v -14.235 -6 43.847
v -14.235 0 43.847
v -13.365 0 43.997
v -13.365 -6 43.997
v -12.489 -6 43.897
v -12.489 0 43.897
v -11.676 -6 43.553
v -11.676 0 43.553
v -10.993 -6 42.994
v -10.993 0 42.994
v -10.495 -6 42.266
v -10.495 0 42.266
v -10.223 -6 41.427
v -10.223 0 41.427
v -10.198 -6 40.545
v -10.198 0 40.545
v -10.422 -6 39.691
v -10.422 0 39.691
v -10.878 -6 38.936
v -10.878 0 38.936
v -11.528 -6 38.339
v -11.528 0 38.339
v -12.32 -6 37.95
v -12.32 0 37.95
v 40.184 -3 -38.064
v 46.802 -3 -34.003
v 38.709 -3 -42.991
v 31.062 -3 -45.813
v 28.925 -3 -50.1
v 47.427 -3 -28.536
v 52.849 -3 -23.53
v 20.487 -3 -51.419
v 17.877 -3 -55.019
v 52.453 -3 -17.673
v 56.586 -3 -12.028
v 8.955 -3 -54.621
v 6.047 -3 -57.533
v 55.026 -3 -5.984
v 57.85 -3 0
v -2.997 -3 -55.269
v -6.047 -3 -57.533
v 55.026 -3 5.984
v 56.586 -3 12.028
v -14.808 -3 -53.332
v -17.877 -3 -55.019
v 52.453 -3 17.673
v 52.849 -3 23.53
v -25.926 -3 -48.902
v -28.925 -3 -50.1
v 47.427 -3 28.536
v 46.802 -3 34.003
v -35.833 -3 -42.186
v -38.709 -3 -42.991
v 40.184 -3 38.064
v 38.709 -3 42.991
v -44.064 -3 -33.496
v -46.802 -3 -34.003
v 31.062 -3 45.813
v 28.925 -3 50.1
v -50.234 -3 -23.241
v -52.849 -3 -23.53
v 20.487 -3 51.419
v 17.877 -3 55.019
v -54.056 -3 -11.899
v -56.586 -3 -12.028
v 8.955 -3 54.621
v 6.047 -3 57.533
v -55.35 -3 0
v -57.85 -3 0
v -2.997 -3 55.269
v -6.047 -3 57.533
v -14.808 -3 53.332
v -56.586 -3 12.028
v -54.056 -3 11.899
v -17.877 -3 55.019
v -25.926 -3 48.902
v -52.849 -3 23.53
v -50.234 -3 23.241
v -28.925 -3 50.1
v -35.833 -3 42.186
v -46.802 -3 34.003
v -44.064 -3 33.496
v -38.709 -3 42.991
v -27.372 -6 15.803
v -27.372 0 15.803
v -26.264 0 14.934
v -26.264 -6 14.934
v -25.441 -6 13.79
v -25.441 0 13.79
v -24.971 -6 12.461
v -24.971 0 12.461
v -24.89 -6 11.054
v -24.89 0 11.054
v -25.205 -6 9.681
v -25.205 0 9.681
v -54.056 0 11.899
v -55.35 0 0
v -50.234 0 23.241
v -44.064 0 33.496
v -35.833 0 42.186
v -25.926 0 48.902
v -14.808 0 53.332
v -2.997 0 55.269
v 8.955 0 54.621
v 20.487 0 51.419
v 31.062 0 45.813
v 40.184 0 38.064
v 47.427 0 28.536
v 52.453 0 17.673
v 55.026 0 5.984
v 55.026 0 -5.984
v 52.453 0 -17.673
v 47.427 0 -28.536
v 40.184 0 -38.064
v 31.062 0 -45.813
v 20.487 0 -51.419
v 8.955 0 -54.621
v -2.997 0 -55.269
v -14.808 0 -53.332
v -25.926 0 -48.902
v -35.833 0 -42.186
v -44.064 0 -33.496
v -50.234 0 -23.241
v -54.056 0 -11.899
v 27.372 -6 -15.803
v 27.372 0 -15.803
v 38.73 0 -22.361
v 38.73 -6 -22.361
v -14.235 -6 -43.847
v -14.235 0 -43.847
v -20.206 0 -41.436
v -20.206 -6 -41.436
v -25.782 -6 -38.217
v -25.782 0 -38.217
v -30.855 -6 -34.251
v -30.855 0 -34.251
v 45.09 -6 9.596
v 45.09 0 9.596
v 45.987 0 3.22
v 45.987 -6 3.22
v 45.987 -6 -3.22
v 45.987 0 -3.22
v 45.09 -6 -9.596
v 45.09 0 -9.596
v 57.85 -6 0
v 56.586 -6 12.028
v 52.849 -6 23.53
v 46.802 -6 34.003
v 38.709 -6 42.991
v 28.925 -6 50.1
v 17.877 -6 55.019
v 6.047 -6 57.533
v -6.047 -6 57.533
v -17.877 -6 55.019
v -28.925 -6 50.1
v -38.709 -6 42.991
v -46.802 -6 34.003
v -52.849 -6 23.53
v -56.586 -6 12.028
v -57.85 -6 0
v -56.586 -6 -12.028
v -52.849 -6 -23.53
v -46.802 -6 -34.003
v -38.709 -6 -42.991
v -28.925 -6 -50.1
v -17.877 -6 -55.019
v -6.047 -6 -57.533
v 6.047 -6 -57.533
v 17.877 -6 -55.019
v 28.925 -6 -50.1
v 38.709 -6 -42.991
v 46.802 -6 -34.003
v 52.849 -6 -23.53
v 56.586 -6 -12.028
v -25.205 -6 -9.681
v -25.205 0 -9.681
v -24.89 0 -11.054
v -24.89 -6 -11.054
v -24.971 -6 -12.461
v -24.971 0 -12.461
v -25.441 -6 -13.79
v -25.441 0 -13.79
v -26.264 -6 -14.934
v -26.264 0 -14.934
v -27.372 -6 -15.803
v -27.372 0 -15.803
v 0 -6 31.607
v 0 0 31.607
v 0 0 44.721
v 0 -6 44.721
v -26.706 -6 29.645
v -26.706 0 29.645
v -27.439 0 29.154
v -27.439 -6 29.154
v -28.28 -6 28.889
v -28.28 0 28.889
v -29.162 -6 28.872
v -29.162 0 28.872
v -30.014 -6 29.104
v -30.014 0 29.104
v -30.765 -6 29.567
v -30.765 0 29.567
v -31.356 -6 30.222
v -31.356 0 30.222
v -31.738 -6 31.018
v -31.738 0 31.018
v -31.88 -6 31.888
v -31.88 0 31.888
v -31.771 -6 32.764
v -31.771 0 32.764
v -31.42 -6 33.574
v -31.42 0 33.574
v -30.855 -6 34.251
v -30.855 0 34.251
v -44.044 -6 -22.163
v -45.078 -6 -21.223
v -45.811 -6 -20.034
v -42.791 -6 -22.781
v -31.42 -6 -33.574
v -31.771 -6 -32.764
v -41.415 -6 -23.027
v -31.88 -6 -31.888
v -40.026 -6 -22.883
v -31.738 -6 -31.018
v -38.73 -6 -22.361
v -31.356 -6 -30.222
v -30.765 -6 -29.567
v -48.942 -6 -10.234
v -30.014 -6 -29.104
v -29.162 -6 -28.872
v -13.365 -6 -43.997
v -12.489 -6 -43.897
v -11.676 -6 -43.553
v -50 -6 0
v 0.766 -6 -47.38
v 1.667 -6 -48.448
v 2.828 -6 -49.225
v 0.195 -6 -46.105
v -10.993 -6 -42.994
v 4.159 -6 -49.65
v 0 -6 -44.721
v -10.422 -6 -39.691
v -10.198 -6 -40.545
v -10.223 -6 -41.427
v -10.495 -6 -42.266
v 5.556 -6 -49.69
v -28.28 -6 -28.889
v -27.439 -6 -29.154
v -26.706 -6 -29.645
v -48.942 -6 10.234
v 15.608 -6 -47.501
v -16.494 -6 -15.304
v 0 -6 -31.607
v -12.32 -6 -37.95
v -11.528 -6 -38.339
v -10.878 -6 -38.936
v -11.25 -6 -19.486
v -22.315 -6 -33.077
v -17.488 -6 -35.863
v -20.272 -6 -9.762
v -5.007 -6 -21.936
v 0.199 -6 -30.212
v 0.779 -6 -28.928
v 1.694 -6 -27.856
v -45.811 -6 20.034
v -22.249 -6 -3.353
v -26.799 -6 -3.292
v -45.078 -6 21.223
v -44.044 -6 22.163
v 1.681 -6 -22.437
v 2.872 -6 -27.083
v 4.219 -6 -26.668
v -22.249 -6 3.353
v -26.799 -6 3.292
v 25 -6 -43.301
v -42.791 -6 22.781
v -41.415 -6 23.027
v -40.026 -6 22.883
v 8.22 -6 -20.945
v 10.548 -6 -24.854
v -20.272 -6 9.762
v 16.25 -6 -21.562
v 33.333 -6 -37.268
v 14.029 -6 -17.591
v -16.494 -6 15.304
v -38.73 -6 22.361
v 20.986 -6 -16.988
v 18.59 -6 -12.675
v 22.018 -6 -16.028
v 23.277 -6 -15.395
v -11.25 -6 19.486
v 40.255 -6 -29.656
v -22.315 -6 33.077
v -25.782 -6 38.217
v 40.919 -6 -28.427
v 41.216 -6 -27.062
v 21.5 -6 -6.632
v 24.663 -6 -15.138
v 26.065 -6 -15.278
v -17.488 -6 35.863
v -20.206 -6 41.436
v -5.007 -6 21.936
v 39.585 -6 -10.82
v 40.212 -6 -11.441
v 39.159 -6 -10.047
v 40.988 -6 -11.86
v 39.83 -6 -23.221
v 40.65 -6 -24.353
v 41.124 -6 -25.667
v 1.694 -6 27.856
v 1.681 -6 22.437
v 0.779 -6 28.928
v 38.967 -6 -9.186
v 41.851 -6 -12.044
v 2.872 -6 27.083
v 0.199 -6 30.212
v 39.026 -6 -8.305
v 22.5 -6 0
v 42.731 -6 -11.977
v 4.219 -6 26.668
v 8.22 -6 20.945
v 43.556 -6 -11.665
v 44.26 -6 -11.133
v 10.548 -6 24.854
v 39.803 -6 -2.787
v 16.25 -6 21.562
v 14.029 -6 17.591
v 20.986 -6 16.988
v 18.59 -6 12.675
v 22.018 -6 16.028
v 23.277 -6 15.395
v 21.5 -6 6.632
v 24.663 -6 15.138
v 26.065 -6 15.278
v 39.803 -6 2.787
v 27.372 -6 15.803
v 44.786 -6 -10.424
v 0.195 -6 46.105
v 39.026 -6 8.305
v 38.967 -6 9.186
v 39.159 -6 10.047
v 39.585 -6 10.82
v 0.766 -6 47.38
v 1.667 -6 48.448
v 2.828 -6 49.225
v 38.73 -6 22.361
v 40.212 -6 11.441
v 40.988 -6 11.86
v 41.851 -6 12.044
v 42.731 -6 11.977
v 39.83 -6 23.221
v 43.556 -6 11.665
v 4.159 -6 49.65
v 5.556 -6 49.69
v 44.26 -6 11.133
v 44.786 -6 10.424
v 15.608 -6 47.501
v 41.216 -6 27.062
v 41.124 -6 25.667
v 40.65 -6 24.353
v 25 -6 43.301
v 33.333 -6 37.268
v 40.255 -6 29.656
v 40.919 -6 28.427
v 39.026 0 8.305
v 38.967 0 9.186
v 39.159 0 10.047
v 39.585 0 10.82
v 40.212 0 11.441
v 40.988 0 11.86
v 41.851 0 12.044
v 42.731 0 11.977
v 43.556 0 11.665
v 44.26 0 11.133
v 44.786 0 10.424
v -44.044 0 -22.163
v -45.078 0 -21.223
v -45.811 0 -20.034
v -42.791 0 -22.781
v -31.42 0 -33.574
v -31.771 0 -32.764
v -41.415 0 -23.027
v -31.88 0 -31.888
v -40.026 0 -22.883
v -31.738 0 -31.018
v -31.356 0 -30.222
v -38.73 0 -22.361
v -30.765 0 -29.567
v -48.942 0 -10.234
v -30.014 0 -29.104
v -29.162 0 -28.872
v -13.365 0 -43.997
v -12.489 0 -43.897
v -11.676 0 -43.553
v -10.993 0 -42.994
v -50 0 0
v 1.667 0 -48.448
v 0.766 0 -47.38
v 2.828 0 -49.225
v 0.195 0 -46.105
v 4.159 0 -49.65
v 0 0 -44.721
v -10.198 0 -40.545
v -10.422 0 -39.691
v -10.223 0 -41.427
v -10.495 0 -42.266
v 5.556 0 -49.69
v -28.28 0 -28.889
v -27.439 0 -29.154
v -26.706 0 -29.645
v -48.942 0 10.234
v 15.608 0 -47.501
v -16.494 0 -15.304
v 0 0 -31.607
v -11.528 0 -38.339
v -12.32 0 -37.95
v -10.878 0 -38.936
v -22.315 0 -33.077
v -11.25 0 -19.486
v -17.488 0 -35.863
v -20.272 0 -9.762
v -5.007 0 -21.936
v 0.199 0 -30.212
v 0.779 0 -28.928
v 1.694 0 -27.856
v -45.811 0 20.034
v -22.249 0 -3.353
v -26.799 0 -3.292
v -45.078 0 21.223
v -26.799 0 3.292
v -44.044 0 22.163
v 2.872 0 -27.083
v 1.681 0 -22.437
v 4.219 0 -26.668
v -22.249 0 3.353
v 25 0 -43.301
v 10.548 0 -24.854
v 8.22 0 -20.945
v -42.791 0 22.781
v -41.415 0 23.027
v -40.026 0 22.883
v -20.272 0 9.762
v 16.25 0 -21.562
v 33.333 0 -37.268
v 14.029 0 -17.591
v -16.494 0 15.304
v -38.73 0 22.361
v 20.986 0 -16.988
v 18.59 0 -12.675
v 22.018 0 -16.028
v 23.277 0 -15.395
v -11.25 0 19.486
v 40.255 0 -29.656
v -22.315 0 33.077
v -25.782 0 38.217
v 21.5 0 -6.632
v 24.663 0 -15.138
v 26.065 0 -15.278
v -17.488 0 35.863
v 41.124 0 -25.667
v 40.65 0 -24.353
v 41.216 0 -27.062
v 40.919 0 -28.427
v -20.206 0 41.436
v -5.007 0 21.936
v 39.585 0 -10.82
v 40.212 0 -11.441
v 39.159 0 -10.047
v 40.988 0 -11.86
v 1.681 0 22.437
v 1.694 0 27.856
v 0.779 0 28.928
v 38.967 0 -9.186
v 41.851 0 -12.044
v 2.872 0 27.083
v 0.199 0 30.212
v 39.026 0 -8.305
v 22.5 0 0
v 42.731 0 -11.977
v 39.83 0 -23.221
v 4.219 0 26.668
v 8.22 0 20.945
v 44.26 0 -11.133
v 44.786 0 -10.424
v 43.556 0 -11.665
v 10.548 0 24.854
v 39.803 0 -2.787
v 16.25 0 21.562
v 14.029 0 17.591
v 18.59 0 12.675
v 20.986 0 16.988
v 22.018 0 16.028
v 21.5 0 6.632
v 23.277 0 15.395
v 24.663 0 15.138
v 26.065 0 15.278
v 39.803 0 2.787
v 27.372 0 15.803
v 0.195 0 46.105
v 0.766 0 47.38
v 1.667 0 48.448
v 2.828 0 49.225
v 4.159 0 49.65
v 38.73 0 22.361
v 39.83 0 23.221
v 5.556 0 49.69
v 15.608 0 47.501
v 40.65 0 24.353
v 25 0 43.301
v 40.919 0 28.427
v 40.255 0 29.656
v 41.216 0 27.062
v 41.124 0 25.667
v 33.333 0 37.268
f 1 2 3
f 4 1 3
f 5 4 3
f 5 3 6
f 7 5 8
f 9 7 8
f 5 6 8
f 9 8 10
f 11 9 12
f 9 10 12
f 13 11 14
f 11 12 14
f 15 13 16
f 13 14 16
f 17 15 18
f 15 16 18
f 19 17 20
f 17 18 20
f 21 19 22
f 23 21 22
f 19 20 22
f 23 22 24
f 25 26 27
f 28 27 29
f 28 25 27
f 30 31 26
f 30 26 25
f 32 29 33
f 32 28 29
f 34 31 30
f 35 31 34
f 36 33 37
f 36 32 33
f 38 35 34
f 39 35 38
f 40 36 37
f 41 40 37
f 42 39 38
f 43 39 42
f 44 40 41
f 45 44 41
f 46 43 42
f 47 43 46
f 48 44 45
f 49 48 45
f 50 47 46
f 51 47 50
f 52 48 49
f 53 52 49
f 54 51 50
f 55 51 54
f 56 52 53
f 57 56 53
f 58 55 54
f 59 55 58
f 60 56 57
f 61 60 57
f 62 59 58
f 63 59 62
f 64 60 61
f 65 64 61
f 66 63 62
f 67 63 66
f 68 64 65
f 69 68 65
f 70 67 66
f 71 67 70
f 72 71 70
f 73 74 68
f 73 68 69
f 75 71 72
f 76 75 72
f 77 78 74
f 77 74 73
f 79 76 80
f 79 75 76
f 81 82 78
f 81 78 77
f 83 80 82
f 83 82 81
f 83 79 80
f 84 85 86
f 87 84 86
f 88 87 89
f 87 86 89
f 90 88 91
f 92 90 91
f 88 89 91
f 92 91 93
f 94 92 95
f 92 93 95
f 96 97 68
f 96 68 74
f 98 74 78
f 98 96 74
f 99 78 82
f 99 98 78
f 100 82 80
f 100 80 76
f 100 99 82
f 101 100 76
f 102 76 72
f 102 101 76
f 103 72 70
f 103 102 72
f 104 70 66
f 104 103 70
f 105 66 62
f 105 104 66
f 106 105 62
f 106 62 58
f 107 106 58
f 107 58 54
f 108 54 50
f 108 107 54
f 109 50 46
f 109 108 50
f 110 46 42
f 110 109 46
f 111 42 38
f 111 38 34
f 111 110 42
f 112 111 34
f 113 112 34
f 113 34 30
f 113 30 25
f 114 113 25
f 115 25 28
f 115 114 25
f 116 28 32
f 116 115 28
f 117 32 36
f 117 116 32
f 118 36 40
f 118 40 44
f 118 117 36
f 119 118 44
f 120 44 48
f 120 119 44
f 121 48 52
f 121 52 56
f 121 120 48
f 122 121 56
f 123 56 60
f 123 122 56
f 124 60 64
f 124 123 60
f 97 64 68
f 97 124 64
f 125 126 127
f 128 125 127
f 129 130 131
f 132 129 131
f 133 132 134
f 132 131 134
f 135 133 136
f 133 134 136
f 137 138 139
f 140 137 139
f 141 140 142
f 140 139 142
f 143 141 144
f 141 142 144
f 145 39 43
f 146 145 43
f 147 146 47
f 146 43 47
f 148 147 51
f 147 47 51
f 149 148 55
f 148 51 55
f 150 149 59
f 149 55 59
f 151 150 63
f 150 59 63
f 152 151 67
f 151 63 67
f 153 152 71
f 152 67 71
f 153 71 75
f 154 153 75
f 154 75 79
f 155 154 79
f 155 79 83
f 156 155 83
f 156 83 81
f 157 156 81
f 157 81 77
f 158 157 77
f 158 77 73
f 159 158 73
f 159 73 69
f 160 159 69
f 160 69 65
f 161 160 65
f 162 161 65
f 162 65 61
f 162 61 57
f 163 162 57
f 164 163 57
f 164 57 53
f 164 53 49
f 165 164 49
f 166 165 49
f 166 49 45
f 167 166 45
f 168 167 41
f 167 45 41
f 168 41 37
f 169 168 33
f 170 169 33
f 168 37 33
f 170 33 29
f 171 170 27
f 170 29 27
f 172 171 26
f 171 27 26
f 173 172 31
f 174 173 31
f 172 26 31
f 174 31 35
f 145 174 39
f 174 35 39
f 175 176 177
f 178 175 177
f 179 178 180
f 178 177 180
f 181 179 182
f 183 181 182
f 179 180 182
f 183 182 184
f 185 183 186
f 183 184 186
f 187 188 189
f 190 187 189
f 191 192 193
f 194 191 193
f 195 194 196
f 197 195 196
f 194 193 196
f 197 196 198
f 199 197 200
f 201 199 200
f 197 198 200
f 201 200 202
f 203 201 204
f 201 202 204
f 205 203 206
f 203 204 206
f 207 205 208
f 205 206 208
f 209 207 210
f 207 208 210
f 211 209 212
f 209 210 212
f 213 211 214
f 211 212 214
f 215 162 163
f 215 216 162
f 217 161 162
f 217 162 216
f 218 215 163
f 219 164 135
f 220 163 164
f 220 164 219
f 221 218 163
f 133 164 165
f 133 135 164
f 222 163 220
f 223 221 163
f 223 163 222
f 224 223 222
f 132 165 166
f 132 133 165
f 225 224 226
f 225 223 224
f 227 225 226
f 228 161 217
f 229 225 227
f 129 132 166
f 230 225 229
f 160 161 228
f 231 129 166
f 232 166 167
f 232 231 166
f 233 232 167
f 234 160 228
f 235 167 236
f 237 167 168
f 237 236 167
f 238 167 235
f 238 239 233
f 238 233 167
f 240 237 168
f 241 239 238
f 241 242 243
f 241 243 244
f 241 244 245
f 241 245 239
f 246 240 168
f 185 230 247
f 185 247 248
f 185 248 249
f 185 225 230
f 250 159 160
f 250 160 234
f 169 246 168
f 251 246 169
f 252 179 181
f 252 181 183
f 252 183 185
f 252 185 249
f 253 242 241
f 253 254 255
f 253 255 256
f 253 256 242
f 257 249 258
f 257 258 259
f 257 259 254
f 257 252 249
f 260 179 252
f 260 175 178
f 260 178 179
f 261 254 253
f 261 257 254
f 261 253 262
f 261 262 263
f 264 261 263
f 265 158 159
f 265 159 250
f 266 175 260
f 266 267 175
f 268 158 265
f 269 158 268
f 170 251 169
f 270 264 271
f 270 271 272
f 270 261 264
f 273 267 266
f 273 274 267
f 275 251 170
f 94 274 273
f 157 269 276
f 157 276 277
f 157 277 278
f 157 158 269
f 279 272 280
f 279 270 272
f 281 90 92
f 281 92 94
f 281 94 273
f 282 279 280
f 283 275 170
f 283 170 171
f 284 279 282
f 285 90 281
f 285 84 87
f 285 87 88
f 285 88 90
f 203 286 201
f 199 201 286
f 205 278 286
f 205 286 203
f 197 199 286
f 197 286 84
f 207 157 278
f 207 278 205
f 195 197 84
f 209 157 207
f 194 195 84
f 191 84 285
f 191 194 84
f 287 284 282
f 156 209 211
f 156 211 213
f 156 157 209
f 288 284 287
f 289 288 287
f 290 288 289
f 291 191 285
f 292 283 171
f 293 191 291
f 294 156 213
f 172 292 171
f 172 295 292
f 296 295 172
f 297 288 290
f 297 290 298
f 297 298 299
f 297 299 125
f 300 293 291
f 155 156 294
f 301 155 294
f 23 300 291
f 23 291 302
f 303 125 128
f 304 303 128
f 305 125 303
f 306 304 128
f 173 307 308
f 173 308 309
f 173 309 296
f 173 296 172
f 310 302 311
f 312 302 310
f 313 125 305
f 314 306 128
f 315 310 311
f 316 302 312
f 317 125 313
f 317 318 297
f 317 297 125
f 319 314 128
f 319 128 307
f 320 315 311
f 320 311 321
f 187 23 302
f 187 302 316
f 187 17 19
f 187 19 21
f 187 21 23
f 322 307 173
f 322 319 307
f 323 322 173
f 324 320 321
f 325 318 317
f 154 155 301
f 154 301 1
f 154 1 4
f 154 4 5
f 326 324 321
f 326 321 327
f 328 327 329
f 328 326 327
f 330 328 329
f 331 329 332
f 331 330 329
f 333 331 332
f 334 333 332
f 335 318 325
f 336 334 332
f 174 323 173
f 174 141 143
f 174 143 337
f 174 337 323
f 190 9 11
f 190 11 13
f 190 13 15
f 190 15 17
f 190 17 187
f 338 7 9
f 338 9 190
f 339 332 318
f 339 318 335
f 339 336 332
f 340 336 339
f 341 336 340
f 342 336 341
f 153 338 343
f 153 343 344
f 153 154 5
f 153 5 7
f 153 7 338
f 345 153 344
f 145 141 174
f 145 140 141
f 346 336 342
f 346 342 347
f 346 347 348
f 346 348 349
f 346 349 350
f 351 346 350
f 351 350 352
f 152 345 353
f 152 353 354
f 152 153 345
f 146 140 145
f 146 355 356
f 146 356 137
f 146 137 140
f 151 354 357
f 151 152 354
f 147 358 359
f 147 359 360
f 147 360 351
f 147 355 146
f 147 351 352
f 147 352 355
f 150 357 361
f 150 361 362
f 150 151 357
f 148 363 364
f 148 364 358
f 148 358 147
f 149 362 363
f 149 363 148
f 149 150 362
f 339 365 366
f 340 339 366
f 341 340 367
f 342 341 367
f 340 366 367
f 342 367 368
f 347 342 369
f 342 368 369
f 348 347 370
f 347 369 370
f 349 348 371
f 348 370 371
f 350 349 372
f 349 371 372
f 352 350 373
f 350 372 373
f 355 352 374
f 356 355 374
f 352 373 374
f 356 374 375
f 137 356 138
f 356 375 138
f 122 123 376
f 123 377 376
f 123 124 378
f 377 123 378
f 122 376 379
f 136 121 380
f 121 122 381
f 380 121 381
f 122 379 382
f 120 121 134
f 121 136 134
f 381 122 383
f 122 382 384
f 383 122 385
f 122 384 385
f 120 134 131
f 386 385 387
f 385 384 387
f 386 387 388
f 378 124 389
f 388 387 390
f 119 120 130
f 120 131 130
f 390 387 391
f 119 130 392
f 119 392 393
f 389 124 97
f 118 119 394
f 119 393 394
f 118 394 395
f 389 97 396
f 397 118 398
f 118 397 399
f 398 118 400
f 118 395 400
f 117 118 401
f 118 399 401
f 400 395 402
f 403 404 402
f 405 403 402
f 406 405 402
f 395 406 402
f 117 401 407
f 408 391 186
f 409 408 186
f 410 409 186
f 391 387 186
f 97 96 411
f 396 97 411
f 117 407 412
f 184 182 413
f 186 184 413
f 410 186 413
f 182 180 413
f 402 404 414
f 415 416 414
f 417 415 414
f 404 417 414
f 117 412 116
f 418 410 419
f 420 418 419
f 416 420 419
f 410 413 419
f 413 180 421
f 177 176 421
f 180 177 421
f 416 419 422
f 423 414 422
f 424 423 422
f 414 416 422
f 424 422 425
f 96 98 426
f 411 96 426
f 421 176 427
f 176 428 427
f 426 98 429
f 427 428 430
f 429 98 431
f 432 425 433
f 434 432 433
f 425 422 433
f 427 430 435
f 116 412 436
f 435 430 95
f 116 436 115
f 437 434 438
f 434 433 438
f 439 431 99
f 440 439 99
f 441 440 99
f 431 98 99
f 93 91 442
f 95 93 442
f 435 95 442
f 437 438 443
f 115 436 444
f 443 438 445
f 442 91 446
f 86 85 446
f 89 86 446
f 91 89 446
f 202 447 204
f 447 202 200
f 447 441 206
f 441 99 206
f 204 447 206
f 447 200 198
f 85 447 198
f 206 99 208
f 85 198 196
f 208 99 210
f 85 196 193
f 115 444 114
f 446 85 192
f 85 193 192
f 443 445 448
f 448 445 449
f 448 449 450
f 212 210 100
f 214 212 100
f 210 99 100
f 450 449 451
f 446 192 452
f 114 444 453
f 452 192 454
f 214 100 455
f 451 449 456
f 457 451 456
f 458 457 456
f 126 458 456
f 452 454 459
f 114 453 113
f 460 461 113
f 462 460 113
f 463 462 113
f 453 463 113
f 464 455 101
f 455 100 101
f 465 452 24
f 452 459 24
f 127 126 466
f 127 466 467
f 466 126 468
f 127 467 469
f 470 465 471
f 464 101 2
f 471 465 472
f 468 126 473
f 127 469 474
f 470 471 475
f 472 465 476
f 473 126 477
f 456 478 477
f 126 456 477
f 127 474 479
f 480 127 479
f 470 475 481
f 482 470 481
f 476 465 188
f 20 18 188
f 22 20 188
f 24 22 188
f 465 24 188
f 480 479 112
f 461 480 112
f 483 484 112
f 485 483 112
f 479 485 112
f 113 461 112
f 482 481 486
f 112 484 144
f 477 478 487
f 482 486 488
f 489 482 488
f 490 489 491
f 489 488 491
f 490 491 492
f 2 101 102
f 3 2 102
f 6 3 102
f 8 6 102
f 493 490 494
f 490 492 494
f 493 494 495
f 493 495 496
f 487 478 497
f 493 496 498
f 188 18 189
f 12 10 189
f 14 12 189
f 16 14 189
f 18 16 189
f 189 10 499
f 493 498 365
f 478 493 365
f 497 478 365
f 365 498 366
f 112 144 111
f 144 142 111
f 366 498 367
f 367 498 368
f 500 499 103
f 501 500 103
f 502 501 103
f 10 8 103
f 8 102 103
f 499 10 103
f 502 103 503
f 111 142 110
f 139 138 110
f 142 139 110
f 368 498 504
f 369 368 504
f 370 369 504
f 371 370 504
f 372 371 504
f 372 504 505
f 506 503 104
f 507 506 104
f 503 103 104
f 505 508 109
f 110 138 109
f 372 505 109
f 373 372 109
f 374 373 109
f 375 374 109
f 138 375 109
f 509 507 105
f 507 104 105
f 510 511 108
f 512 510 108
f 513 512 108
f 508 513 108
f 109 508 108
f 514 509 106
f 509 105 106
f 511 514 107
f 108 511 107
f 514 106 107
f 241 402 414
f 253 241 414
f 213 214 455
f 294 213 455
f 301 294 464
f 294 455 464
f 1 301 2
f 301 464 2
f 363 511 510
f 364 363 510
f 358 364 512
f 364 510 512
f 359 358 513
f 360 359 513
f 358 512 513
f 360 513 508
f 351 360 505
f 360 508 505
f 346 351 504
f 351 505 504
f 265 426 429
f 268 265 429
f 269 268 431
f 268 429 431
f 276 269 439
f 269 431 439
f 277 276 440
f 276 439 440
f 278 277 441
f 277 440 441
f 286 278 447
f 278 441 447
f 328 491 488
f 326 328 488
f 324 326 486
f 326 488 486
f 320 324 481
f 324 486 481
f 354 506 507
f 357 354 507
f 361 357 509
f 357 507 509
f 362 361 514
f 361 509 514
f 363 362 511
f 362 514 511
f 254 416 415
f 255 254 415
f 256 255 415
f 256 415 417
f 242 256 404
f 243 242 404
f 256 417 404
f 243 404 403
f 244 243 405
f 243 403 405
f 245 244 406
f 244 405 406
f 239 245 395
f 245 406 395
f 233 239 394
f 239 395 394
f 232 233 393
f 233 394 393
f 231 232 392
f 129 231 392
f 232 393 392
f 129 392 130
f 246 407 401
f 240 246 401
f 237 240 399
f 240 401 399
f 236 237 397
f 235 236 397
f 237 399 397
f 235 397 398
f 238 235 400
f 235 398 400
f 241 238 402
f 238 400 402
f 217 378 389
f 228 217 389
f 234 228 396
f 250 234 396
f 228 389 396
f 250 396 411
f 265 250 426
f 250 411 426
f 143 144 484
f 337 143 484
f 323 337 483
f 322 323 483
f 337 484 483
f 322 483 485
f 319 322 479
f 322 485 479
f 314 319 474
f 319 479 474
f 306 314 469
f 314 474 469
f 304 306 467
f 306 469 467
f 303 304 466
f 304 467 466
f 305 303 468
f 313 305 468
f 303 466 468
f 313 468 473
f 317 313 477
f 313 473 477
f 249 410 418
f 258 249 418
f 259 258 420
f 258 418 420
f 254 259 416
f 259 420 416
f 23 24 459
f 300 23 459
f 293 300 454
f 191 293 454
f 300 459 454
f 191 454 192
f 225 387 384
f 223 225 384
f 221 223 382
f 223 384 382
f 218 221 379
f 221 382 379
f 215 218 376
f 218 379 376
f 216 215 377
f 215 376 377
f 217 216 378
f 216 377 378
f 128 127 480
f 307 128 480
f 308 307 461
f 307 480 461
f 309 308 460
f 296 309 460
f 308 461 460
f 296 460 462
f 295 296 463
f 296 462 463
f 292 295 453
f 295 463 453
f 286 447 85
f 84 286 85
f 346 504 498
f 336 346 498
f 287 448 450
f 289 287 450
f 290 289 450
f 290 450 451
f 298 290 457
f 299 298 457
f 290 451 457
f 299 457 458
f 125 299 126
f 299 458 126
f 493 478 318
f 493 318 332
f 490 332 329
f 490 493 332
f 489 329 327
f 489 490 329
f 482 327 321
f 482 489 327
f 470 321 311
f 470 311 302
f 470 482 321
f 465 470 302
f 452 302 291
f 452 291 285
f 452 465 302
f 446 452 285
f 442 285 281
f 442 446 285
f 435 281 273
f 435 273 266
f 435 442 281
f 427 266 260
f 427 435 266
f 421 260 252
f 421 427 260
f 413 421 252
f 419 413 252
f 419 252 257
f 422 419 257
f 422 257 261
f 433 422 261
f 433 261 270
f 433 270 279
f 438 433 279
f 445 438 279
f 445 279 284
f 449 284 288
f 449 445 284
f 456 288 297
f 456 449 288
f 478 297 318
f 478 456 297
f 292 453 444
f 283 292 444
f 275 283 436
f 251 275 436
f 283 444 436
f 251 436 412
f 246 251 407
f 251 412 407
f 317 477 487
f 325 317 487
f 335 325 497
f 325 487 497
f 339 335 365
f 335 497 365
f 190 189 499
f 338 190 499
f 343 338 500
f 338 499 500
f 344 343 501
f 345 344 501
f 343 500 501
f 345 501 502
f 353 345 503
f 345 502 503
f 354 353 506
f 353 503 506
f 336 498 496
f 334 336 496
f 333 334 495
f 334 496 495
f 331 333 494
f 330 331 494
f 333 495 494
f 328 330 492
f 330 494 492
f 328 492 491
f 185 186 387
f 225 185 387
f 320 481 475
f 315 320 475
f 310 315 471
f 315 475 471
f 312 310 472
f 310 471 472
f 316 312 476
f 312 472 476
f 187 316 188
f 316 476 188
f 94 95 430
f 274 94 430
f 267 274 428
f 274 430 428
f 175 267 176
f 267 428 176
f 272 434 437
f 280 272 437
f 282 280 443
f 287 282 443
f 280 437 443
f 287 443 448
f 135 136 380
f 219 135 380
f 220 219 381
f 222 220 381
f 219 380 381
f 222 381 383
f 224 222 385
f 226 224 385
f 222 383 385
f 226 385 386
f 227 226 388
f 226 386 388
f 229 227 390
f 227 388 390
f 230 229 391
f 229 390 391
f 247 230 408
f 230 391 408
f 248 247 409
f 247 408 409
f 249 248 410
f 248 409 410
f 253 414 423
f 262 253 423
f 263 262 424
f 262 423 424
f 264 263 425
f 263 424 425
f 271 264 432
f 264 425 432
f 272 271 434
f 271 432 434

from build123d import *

# Parameters (mm, degrees)
F0_R     = 57.85
F0_R_2   = 22.5
F1_DEPTH = 6
F2_R     = 57.85
F2_R_2   = 55.35
F3_DEPTH = 3


with BuildPart() as f1:
    # F0 (on Front) → F1 (new body)
    with BuildSketch(Plane.XZ):
        Circle(F0_R)
        with BuildLine():
            ThreePointArc((-12.320414, -37.950196), (-10.329128, -41.855933), (-14.234864, -43.847219))
            ThreePointArc((-14.234864, -43.847219), (-23.05, -39.923771), (-30.855373, -34.251364))
            ThreePointArc((-30.855373, -34.251364), (-31.083737, -29.873254), (-26.705627, -29.64489))
            ThreePointArc((-26.705627, -29.64489), (-19.95, -34.554414), (-12.320414, -37.950196))
        make_face(mode=Mode.SUBTRACT)
        with BuildLine():
            ThreePointArc((-27.372431, 15.803481), (-25.159068, 13.141948), (-25.204864, 9.680642))
            ThreePointArc((-25.204864, 9.680642), (-27, 0), (-25.204864, -9.680642))
            ThreePointArc((-25.204864, -9.680642), (-25.159068, -13.141948), (-27.372431, -15.803481))
            Line((-27.372431, -15.803481), (-38.729833, -22.36068))
            ThreePointArc((-38.729833, -22.36068), (-42.790653, -22.780694), (-45.810926, -20.033948))
            ThreePointArc((-45.810926, -20.033948), (-50, 0), (-45.810926, 20.033948))
            ThreePointArc((-45.810926, 20.033948), (-42.790653, 22.780694), (-38.729833, 22.36068))
            Line((-38.729833, 22.36068), (-27.372431, 15.803481))
        make_face(mode=Mode.SUBTRACT)
        Circle(F0_R_2, mode=Mode.SUBTRACT)
        with BuildLine():
            Line((0, -44.72136), (0, -31.606961))
            ThreePointArc((0, -31.606961), (1.198273, -28.359366), (4.21875, -26.668374))
            ThreePointArc((4.21875, -26.668374), (13.5, -23.382686), (20.986114, -16.987731))
            ThreePointArc((20.986114, -16.987731), (23.960795, -15.217418), (27.372431, -15.803481))
            Line((27.372431, -15.803481), (38.729833, -22.36068))
            ThreePointArc((38.729833, -22.36068), (41.123986, -25.667445), (40.255371, -29.656452))
            ThreePointArc((40.255371, -29.656452), (25, -43.30127), (5.555556, -49.690399))
            ThreePointArc((5.555556, -49.690399), (1.666667, -48.44814), (0, -44.72136))
        make_face(mode=Mode.SUBTRACT)
        with BuildLine():
            ThreePointArc((45.090238, 9.595855), (46.1, 0), (45.090238, -9.595855))
            ThreePointArc((45.090238, -9.595855), (41.412865, -11.982679), (39.026041, -8.305306))
            ThreePointArc((39.026041, -8.305306), (39.9, 0), (39.026041, 8.305306))
            ThreePointArc((39.026041, 8.305306), (41.412865, 11.982679), (45.090238, 9.595855))
        make_face(mode=Mode.SUBTRACT)
        with BuildLine():
            ThreePointArc((-30.855373, 34.251364), (-23.05, 39.923771), (-14.234864, 43.847219))
            ThreePointArc((-14.234864, 43.847219), (-10.329128, 41.855933), (-12.320414, 37.950196))
            ThreePointArc((-12.320414, 37.950196), (-19.95, 34.554414), (-26.705627, 29.64489))
            ThreePointArc((-26.705627, 29.64489), (-31.083737, 29.873254), (-30.855373, 34.251364))
        make_face(mode=Mode.SUBTRACT)
        with BuildLine():
            ThreePointArc((20.986114, 16.987731), (13.5, 23.382686), (4.21875, 26.668374))
            ThreePointArc((4.21875, 26.668374), (1.198273, 28.359366), (0, 31.606961))
            Line((0, 31.606961), (0, 44.72136))
            ThreePointArc((0, 44.72136), (1.666667, 48.44814), (5.555556, 49.690399))
            ThreePointArc((5.555556, 49.690399), (25, 43.30127), (40.255371, 29.656452))
            ThreePointArc((40.255371, 29.656452), (41.123986, 25.667445), (38.729833, 22.36068))
            Line((38.729833, 22.36068), (27.372431, 15.803481))
            ThreePointArc((27.372431, 15.803481), (23.960795, 15.217418), (20.986114, 16.987731))
        make_face(mode=Mode.SUBTRACT)
    extrude(amount=F1_DEPTH)

    # F2 (on face) → F3 (cut)
    with BuildSketch(Plane(origin=(0, 0, 0), x_dir=(-1, 0, 0), z_dir=(0, 1, 0))):
        Circle(F2_R)
        Circle(F2_R_2, mode=Mode.SUBTRACT)
    extrude(amount=-F3_DEPTH, mode=Mode.SUBTRACT)


solid = f1.part
